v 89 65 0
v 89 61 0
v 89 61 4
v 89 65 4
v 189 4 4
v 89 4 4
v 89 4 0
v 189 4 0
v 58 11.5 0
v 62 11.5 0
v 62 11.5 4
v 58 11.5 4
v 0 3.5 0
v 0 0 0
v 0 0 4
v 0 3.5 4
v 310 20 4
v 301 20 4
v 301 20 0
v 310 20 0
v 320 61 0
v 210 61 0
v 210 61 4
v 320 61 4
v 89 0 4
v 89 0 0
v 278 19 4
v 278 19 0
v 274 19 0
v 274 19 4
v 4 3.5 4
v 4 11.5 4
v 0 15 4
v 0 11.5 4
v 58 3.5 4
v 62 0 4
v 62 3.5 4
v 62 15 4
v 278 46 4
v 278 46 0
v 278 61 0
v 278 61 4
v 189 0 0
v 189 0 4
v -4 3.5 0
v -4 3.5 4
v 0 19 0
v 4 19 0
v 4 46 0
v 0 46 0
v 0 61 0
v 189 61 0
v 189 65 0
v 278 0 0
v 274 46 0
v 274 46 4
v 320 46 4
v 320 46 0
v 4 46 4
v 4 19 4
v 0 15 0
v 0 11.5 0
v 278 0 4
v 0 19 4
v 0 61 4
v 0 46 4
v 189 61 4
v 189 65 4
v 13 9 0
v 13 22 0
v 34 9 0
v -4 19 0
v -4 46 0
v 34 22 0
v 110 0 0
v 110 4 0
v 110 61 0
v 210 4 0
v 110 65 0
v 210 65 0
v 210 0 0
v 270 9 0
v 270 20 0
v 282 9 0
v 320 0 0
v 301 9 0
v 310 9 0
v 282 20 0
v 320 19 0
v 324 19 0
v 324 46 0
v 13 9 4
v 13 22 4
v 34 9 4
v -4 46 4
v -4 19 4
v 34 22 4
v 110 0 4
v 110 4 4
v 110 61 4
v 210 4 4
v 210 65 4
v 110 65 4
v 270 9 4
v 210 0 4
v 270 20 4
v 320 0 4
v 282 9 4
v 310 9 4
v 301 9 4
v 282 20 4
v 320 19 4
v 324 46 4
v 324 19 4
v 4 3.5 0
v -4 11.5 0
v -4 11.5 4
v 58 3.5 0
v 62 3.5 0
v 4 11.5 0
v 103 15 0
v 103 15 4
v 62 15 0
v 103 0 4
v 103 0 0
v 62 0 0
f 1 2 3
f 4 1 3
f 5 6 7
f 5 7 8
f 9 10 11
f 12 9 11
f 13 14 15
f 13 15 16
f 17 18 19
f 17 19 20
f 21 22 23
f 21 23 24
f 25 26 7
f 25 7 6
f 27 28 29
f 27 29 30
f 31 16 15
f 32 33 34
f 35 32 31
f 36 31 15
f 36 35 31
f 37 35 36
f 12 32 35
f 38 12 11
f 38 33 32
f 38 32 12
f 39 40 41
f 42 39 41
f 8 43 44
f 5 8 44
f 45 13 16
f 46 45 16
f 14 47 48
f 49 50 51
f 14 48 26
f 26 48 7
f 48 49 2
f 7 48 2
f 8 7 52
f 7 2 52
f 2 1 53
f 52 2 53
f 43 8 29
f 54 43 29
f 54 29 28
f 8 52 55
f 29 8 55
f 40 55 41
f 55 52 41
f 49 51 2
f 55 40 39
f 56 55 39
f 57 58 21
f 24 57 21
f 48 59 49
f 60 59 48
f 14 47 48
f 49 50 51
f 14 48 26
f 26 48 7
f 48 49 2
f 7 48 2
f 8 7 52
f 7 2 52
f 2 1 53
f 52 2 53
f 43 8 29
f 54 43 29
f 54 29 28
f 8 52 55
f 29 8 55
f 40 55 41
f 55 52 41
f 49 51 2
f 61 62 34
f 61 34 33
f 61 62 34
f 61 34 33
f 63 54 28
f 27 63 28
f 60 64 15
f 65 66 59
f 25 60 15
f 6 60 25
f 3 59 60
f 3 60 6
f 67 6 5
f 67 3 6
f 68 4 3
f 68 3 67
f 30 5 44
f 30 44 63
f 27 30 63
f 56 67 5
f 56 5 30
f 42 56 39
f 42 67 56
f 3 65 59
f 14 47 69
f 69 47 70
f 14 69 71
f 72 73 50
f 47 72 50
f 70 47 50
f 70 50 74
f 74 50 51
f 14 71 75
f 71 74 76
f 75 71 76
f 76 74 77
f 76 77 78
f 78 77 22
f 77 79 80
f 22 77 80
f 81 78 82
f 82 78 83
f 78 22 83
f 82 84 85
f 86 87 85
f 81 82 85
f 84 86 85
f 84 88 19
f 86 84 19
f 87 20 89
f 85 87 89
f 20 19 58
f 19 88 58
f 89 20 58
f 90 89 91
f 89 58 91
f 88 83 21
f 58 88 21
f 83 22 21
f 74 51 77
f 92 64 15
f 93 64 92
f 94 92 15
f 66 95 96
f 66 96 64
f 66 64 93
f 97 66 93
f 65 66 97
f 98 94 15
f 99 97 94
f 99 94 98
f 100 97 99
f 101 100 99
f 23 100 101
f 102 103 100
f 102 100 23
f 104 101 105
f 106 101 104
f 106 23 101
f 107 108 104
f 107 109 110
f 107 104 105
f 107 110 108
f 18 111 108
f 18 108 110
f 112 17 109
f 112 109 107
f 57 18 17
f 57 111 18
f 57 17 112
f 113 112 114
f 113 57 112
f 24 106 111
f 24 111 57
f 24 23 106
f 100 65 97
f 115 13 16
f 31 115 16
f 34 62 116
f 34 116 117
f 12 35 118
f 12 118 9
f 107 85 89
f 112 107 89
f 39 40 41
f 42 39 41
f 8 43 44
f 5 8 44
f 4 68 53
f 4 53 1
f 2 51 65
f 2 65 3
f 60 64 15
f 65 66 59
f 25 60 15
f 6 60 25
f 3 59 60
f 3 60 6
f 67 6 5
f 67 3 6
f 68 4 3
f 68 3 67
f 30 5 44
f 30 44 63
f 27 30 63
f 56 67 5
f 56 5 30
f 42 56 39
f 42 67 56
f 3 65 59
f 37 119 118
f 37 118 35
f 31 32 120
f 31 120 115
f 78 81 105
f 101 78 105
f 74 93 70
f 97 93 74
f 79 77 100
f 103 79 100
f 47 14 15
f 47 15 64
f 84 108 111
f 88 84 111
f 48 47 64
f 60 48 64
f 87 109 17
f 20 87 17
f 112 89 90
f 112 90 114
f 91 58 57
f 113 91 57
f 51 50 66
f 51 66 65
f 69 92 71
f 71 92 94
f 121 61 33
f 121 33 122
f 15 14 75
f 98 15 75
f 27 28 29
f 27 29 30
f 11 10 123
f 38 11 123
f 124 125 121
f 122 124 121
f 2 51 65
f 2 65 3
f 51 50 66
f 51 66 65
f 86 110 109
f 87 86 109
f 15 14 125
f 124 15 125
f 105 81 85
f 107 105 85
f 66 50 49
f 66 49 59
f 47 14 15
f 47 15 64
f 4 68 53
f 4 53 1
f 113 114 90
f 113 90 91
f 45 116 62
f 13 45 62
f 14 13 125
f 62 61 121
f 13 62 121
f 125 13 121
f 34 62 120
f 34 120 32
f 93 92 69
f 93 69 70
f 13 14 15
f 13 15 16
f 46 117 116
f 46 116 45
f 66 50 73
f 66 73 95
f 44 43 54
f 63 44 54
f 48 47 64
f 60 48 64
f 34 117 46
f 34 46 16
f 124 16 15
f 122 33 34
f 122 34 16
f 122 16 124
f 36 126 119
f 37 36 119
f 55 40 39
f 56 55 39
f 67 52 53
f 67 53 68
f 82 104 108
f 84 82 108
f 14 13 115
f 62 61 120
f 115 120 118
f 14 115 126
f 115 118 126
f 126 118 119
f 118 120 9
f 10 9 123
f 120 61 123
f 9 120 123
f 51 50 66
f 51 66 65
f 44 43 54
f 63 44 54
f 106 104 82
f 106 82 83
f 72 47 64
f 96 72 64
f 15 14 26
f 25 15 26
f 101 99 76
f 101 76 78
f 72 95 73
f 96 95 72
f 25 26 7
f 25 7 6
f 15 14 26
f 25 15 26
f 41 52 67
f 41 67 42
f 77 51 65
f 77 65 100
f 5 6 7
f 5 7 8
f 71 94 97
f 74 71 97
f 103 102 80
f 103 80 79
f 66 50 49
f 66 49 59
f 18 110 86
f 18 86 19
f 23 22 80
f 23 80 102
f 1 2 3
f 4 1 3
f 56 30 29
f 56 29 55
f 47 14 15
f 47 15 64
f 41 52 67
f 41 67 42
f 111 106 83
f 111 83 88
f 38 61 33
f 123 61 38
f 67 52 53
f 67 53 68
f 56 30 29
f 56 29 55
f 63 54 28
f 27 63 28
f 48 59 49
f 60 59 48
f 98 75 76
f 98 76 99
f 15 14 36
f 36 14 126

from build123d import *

# Parameters (mm, degrees)
BOX_W           = 278
BOX_H           = 61
BOX_DEPTH       = 4
SKETCH_W        = 100
SKETCH_H        = 4
POCKET_DEPTH    = 4
SKETCH001_W     = 100
SKETCH001_H     = 4
PAD_DEPTH       = 4
SKETCH002_W     = 27
SKETCH002_H     = 4
POCKET001_DEPTH = 4
SKETCH003_W     = 27
SKETCH003_H     = 4
POCKET002_DEPTH = 4
BOX001_W        = 320
BOX001_H        = 61
BOX001_DEPTH    = 4
SKETCH004_W     = 100
SKETCH004_H     = 4
POCKET003_DEPTH = 4
SKETCH005_W     = 100
SKETCH005_H     = 4
PAD001_DEPTH    = 4
SKETCH006_W     = 27
SKETCH006_H     = 4
PAD002_DEPTH    = 4
SKETCH007_W     = 27
SKETCH007_H     = 4
PAD003_DEPTH    = 4
SKETCH008_W     = 21
SKETCH008_H     = 13
SKETCH008_W_2   = 12
SKETCH008_H_2   = 11
SKETCH008_W_3   = 9
POCKET004_DEPTH = 5
BOX002_W        = 103
BOX002_H        = 15
BOX002_DEPTH    = 4
SKETCH009_W     = 8
SKETCH009_H     = 4
PAD004_DEPTH    = 4
BOX003_W        = 62
BOX003_H        = 15
BOX003_DEPTH    = 4
SKETCH010_W     = 8
SKETCH010_H     = 4
POCKET005_DEPTH = 4
SKETCH011_W     = 8
SKETCH011_H     = 4
POCKET006_DEPTH = 4
SKETCH012_W     = 27
SKETCH012_H     = 4
POCKET007_DEPTH = 4


with BuildPart() as pocket001:
    # Box → Box (new body)
    with BuildSketch(Plane.XY):
        with Locations((139, 30.5)):
            Rectangle(BOX_W, BOX_H)
    extrude(amount=BOX_DEPTH)

    # Sketch → Pocket (cut)
    with BuildSketch(Plane.XZ):
        with Locations((139, 2)):
            Rectangle(SKETCH_W, SKETCH_H)
    extrude(amount=-POCKET_DEPTH, mode=Mode.SUBTRACT)

    # Sketch001 → Pad (new body)
    with BuildSketch(Plane(origin=(0, 61, 0), x_dir=(-1, 0, 0), z_dir=(0, 1, 0))):
        with Locations((-139, 2)):
            Rectangle(SKETCH001_W, SKETCH001_H)
    extrude(amount=PAD_DEPTH)

    # Sketch002 → Pocket001 (cut)
    with BuildSketch(Plane.YZ.offset(278)):
        with Locations((32.5, 2)):
            Rectangle(SKETCH002_W, SKETCH002_H)
    extrude(amount=-POCKET001_DEPTH, mode=Mode.SUBTRACT)


with BuildPart() as interface_4mm_5_amarillo:
    # Pocket002 base: copy of Pocket001
    add(pocket001.part)

    # Sketch003 → Pocket002 (cut)
    with BuildSketch(Plane(origin=(0, 0, 0), x_dir=(0, -1, 0), z_dir=(-1, 0, 0))):
        with Locations((-32.5, 2)):
            Rectangle(SKETCH003_W, SKETCH003_H)
    extrude(amount=-POCKET002_DEPTH, mode=Mode.SUBTRACT)


with BuildPart() as pocket004:
    # Box001 → Box001 (new body)
    with BuildSketch(Plane.XY):
        with Locations((160, 30.5)):
            Rectangle(BOX001_W, BOX001_H)
    extrude(amount=BOX001_DEPTH)

    # Sketch004 → Pocket003 (cut)
    with BuildSketch(Plane.XZ):
        with Locations((160, 2)):
            Rectangle(SKETCH004_W, SKETCH004_H)
    extrude(amount=-POCKET003_DEPTH, mode=Mode.SUBTRACT)

    # Sketch005 → Pad001 (new body)
    with BuildSketch(Plane(origin=(0, 61, 0), x_dir=(-1, 0, 0), z_dir=(0, 1, 0))):
        with Locations((-160, 2)):
            Rectangle(SKETCH005_W, SKETCH005_H)
    extrude(amount=PAD001_DEPTH)

    # Sketch006 → Pad002 (new body)
    with BuildSketch(Plane(origin=(0, 0, 0), x_dir=(0, -1, 0), z_dir=(-1, 0, 0))):
        with Locations((-32.5, 2)):
            Rectangle(SKETCH006_W, SKETCH006_H)
    extrude(amount=PAD002_DEPTH)

    # Sketch007 → Pad003 (new body)
    with BuildSketch(Plane.YZ.offset(320)):
        with Locations((32.5, 2)):
            Rectangle(SKETCH007_W, SKETCH007_H)
    extrude(amount=PAD003_DEPTH)

    # Sketch008 → Pocket004 (cut)
    with BuildSketch(Plane.XY.offset(4)):
        with Locations((23.5, 15.5)):
            Rectangle(SKETCH008_W, SKETCH008_H)
        with Locations((276, 14.5)):
            Rectangle(SKETCH008_W_2, SKETCH008_H_2)
        with Locations((305.5, 14.5)):
            Rectangle(SKETCH008_W_3, SKETCH008_H_2)
    extrude(amount=-POCKET004_DEPTH, mode=Mode.SUBTRACT)


with BuildPart() as pad004:
    # Box002 → Box002 (new body)
    with BuildSketch(Plane.XY):
        with Locations((51.5, 7.5)):
            Rectangle(BOX002_W, BOX002_H)
    extrude(amount=BOX002_DEPTH)

    # Sketch009 → Pad004 (new body)
    with BuildSketch(Plane(origin=(0, 0, 0), x_dir=(0, -1, 0), z_dir=(-1, 0, 0))):
        with Locations((-7.5, 2)):
            Rectangle(SKETCH009_W, SKETCH009_H)
    extrude(amount=PAD004_DEPTH)


with BuildPart() as pocket006:
    # Box003 → Box003 (new body)
    with BuildSketch(Plane.XY):
        with Locations((31, 7.5)):
            Rectangle(BOX003_W, BOX003_H)
    extrude(amount=BOX003_DEPTH)

    # Sketch010 → Pocket005 (cut)
    with BuildSketch(Plane.YZ.offset(62)):
        with Locations((7.5, 2)):
            Rectangle(SKETCH010_W, SKETCH010_H)
    extrude(amount=-POCKET005_DEPTH, mode=Mode.SUBTRACT)

    # Sketch011 → Pocket006 (cut)
    with BuildSketch(Plane(origin=(0, 0, 0), x_dir=(0, -1, 0), z_dir=(-1, 0, 0))):
        with Locations((-7.5, 2)):
            Rectangle(SKETCH011_W, SKETCH011_H)
    extrude(amount=-POCKET006_DEPTH, mode=Mode.SUBTRACT)


with BuildPart() as interface_4mm_8_rojo:
    # Pocket007 base: copy of Pocket001
    add(pocket001.part)

    # Sketch012 → Pocket007 (cut)
    with BuildSketch(Plane(origin=(0, 0, 0), x_dir=(0, -1, 0), z_dir=(-1, 0, 0))):
        with Locations((-32.5, 2)):
            Rectangle(SKETCH012_W, SKETCH012_H)
    extrude(amount=-POCKET007_DEPTH, mode=Mode.SUBTRACT)


solid = Compound([interface_4mm_5_amarillo.part, pocket004.part, pad004.part, pocket006.part, interface_4mm_8_rojo.part])
